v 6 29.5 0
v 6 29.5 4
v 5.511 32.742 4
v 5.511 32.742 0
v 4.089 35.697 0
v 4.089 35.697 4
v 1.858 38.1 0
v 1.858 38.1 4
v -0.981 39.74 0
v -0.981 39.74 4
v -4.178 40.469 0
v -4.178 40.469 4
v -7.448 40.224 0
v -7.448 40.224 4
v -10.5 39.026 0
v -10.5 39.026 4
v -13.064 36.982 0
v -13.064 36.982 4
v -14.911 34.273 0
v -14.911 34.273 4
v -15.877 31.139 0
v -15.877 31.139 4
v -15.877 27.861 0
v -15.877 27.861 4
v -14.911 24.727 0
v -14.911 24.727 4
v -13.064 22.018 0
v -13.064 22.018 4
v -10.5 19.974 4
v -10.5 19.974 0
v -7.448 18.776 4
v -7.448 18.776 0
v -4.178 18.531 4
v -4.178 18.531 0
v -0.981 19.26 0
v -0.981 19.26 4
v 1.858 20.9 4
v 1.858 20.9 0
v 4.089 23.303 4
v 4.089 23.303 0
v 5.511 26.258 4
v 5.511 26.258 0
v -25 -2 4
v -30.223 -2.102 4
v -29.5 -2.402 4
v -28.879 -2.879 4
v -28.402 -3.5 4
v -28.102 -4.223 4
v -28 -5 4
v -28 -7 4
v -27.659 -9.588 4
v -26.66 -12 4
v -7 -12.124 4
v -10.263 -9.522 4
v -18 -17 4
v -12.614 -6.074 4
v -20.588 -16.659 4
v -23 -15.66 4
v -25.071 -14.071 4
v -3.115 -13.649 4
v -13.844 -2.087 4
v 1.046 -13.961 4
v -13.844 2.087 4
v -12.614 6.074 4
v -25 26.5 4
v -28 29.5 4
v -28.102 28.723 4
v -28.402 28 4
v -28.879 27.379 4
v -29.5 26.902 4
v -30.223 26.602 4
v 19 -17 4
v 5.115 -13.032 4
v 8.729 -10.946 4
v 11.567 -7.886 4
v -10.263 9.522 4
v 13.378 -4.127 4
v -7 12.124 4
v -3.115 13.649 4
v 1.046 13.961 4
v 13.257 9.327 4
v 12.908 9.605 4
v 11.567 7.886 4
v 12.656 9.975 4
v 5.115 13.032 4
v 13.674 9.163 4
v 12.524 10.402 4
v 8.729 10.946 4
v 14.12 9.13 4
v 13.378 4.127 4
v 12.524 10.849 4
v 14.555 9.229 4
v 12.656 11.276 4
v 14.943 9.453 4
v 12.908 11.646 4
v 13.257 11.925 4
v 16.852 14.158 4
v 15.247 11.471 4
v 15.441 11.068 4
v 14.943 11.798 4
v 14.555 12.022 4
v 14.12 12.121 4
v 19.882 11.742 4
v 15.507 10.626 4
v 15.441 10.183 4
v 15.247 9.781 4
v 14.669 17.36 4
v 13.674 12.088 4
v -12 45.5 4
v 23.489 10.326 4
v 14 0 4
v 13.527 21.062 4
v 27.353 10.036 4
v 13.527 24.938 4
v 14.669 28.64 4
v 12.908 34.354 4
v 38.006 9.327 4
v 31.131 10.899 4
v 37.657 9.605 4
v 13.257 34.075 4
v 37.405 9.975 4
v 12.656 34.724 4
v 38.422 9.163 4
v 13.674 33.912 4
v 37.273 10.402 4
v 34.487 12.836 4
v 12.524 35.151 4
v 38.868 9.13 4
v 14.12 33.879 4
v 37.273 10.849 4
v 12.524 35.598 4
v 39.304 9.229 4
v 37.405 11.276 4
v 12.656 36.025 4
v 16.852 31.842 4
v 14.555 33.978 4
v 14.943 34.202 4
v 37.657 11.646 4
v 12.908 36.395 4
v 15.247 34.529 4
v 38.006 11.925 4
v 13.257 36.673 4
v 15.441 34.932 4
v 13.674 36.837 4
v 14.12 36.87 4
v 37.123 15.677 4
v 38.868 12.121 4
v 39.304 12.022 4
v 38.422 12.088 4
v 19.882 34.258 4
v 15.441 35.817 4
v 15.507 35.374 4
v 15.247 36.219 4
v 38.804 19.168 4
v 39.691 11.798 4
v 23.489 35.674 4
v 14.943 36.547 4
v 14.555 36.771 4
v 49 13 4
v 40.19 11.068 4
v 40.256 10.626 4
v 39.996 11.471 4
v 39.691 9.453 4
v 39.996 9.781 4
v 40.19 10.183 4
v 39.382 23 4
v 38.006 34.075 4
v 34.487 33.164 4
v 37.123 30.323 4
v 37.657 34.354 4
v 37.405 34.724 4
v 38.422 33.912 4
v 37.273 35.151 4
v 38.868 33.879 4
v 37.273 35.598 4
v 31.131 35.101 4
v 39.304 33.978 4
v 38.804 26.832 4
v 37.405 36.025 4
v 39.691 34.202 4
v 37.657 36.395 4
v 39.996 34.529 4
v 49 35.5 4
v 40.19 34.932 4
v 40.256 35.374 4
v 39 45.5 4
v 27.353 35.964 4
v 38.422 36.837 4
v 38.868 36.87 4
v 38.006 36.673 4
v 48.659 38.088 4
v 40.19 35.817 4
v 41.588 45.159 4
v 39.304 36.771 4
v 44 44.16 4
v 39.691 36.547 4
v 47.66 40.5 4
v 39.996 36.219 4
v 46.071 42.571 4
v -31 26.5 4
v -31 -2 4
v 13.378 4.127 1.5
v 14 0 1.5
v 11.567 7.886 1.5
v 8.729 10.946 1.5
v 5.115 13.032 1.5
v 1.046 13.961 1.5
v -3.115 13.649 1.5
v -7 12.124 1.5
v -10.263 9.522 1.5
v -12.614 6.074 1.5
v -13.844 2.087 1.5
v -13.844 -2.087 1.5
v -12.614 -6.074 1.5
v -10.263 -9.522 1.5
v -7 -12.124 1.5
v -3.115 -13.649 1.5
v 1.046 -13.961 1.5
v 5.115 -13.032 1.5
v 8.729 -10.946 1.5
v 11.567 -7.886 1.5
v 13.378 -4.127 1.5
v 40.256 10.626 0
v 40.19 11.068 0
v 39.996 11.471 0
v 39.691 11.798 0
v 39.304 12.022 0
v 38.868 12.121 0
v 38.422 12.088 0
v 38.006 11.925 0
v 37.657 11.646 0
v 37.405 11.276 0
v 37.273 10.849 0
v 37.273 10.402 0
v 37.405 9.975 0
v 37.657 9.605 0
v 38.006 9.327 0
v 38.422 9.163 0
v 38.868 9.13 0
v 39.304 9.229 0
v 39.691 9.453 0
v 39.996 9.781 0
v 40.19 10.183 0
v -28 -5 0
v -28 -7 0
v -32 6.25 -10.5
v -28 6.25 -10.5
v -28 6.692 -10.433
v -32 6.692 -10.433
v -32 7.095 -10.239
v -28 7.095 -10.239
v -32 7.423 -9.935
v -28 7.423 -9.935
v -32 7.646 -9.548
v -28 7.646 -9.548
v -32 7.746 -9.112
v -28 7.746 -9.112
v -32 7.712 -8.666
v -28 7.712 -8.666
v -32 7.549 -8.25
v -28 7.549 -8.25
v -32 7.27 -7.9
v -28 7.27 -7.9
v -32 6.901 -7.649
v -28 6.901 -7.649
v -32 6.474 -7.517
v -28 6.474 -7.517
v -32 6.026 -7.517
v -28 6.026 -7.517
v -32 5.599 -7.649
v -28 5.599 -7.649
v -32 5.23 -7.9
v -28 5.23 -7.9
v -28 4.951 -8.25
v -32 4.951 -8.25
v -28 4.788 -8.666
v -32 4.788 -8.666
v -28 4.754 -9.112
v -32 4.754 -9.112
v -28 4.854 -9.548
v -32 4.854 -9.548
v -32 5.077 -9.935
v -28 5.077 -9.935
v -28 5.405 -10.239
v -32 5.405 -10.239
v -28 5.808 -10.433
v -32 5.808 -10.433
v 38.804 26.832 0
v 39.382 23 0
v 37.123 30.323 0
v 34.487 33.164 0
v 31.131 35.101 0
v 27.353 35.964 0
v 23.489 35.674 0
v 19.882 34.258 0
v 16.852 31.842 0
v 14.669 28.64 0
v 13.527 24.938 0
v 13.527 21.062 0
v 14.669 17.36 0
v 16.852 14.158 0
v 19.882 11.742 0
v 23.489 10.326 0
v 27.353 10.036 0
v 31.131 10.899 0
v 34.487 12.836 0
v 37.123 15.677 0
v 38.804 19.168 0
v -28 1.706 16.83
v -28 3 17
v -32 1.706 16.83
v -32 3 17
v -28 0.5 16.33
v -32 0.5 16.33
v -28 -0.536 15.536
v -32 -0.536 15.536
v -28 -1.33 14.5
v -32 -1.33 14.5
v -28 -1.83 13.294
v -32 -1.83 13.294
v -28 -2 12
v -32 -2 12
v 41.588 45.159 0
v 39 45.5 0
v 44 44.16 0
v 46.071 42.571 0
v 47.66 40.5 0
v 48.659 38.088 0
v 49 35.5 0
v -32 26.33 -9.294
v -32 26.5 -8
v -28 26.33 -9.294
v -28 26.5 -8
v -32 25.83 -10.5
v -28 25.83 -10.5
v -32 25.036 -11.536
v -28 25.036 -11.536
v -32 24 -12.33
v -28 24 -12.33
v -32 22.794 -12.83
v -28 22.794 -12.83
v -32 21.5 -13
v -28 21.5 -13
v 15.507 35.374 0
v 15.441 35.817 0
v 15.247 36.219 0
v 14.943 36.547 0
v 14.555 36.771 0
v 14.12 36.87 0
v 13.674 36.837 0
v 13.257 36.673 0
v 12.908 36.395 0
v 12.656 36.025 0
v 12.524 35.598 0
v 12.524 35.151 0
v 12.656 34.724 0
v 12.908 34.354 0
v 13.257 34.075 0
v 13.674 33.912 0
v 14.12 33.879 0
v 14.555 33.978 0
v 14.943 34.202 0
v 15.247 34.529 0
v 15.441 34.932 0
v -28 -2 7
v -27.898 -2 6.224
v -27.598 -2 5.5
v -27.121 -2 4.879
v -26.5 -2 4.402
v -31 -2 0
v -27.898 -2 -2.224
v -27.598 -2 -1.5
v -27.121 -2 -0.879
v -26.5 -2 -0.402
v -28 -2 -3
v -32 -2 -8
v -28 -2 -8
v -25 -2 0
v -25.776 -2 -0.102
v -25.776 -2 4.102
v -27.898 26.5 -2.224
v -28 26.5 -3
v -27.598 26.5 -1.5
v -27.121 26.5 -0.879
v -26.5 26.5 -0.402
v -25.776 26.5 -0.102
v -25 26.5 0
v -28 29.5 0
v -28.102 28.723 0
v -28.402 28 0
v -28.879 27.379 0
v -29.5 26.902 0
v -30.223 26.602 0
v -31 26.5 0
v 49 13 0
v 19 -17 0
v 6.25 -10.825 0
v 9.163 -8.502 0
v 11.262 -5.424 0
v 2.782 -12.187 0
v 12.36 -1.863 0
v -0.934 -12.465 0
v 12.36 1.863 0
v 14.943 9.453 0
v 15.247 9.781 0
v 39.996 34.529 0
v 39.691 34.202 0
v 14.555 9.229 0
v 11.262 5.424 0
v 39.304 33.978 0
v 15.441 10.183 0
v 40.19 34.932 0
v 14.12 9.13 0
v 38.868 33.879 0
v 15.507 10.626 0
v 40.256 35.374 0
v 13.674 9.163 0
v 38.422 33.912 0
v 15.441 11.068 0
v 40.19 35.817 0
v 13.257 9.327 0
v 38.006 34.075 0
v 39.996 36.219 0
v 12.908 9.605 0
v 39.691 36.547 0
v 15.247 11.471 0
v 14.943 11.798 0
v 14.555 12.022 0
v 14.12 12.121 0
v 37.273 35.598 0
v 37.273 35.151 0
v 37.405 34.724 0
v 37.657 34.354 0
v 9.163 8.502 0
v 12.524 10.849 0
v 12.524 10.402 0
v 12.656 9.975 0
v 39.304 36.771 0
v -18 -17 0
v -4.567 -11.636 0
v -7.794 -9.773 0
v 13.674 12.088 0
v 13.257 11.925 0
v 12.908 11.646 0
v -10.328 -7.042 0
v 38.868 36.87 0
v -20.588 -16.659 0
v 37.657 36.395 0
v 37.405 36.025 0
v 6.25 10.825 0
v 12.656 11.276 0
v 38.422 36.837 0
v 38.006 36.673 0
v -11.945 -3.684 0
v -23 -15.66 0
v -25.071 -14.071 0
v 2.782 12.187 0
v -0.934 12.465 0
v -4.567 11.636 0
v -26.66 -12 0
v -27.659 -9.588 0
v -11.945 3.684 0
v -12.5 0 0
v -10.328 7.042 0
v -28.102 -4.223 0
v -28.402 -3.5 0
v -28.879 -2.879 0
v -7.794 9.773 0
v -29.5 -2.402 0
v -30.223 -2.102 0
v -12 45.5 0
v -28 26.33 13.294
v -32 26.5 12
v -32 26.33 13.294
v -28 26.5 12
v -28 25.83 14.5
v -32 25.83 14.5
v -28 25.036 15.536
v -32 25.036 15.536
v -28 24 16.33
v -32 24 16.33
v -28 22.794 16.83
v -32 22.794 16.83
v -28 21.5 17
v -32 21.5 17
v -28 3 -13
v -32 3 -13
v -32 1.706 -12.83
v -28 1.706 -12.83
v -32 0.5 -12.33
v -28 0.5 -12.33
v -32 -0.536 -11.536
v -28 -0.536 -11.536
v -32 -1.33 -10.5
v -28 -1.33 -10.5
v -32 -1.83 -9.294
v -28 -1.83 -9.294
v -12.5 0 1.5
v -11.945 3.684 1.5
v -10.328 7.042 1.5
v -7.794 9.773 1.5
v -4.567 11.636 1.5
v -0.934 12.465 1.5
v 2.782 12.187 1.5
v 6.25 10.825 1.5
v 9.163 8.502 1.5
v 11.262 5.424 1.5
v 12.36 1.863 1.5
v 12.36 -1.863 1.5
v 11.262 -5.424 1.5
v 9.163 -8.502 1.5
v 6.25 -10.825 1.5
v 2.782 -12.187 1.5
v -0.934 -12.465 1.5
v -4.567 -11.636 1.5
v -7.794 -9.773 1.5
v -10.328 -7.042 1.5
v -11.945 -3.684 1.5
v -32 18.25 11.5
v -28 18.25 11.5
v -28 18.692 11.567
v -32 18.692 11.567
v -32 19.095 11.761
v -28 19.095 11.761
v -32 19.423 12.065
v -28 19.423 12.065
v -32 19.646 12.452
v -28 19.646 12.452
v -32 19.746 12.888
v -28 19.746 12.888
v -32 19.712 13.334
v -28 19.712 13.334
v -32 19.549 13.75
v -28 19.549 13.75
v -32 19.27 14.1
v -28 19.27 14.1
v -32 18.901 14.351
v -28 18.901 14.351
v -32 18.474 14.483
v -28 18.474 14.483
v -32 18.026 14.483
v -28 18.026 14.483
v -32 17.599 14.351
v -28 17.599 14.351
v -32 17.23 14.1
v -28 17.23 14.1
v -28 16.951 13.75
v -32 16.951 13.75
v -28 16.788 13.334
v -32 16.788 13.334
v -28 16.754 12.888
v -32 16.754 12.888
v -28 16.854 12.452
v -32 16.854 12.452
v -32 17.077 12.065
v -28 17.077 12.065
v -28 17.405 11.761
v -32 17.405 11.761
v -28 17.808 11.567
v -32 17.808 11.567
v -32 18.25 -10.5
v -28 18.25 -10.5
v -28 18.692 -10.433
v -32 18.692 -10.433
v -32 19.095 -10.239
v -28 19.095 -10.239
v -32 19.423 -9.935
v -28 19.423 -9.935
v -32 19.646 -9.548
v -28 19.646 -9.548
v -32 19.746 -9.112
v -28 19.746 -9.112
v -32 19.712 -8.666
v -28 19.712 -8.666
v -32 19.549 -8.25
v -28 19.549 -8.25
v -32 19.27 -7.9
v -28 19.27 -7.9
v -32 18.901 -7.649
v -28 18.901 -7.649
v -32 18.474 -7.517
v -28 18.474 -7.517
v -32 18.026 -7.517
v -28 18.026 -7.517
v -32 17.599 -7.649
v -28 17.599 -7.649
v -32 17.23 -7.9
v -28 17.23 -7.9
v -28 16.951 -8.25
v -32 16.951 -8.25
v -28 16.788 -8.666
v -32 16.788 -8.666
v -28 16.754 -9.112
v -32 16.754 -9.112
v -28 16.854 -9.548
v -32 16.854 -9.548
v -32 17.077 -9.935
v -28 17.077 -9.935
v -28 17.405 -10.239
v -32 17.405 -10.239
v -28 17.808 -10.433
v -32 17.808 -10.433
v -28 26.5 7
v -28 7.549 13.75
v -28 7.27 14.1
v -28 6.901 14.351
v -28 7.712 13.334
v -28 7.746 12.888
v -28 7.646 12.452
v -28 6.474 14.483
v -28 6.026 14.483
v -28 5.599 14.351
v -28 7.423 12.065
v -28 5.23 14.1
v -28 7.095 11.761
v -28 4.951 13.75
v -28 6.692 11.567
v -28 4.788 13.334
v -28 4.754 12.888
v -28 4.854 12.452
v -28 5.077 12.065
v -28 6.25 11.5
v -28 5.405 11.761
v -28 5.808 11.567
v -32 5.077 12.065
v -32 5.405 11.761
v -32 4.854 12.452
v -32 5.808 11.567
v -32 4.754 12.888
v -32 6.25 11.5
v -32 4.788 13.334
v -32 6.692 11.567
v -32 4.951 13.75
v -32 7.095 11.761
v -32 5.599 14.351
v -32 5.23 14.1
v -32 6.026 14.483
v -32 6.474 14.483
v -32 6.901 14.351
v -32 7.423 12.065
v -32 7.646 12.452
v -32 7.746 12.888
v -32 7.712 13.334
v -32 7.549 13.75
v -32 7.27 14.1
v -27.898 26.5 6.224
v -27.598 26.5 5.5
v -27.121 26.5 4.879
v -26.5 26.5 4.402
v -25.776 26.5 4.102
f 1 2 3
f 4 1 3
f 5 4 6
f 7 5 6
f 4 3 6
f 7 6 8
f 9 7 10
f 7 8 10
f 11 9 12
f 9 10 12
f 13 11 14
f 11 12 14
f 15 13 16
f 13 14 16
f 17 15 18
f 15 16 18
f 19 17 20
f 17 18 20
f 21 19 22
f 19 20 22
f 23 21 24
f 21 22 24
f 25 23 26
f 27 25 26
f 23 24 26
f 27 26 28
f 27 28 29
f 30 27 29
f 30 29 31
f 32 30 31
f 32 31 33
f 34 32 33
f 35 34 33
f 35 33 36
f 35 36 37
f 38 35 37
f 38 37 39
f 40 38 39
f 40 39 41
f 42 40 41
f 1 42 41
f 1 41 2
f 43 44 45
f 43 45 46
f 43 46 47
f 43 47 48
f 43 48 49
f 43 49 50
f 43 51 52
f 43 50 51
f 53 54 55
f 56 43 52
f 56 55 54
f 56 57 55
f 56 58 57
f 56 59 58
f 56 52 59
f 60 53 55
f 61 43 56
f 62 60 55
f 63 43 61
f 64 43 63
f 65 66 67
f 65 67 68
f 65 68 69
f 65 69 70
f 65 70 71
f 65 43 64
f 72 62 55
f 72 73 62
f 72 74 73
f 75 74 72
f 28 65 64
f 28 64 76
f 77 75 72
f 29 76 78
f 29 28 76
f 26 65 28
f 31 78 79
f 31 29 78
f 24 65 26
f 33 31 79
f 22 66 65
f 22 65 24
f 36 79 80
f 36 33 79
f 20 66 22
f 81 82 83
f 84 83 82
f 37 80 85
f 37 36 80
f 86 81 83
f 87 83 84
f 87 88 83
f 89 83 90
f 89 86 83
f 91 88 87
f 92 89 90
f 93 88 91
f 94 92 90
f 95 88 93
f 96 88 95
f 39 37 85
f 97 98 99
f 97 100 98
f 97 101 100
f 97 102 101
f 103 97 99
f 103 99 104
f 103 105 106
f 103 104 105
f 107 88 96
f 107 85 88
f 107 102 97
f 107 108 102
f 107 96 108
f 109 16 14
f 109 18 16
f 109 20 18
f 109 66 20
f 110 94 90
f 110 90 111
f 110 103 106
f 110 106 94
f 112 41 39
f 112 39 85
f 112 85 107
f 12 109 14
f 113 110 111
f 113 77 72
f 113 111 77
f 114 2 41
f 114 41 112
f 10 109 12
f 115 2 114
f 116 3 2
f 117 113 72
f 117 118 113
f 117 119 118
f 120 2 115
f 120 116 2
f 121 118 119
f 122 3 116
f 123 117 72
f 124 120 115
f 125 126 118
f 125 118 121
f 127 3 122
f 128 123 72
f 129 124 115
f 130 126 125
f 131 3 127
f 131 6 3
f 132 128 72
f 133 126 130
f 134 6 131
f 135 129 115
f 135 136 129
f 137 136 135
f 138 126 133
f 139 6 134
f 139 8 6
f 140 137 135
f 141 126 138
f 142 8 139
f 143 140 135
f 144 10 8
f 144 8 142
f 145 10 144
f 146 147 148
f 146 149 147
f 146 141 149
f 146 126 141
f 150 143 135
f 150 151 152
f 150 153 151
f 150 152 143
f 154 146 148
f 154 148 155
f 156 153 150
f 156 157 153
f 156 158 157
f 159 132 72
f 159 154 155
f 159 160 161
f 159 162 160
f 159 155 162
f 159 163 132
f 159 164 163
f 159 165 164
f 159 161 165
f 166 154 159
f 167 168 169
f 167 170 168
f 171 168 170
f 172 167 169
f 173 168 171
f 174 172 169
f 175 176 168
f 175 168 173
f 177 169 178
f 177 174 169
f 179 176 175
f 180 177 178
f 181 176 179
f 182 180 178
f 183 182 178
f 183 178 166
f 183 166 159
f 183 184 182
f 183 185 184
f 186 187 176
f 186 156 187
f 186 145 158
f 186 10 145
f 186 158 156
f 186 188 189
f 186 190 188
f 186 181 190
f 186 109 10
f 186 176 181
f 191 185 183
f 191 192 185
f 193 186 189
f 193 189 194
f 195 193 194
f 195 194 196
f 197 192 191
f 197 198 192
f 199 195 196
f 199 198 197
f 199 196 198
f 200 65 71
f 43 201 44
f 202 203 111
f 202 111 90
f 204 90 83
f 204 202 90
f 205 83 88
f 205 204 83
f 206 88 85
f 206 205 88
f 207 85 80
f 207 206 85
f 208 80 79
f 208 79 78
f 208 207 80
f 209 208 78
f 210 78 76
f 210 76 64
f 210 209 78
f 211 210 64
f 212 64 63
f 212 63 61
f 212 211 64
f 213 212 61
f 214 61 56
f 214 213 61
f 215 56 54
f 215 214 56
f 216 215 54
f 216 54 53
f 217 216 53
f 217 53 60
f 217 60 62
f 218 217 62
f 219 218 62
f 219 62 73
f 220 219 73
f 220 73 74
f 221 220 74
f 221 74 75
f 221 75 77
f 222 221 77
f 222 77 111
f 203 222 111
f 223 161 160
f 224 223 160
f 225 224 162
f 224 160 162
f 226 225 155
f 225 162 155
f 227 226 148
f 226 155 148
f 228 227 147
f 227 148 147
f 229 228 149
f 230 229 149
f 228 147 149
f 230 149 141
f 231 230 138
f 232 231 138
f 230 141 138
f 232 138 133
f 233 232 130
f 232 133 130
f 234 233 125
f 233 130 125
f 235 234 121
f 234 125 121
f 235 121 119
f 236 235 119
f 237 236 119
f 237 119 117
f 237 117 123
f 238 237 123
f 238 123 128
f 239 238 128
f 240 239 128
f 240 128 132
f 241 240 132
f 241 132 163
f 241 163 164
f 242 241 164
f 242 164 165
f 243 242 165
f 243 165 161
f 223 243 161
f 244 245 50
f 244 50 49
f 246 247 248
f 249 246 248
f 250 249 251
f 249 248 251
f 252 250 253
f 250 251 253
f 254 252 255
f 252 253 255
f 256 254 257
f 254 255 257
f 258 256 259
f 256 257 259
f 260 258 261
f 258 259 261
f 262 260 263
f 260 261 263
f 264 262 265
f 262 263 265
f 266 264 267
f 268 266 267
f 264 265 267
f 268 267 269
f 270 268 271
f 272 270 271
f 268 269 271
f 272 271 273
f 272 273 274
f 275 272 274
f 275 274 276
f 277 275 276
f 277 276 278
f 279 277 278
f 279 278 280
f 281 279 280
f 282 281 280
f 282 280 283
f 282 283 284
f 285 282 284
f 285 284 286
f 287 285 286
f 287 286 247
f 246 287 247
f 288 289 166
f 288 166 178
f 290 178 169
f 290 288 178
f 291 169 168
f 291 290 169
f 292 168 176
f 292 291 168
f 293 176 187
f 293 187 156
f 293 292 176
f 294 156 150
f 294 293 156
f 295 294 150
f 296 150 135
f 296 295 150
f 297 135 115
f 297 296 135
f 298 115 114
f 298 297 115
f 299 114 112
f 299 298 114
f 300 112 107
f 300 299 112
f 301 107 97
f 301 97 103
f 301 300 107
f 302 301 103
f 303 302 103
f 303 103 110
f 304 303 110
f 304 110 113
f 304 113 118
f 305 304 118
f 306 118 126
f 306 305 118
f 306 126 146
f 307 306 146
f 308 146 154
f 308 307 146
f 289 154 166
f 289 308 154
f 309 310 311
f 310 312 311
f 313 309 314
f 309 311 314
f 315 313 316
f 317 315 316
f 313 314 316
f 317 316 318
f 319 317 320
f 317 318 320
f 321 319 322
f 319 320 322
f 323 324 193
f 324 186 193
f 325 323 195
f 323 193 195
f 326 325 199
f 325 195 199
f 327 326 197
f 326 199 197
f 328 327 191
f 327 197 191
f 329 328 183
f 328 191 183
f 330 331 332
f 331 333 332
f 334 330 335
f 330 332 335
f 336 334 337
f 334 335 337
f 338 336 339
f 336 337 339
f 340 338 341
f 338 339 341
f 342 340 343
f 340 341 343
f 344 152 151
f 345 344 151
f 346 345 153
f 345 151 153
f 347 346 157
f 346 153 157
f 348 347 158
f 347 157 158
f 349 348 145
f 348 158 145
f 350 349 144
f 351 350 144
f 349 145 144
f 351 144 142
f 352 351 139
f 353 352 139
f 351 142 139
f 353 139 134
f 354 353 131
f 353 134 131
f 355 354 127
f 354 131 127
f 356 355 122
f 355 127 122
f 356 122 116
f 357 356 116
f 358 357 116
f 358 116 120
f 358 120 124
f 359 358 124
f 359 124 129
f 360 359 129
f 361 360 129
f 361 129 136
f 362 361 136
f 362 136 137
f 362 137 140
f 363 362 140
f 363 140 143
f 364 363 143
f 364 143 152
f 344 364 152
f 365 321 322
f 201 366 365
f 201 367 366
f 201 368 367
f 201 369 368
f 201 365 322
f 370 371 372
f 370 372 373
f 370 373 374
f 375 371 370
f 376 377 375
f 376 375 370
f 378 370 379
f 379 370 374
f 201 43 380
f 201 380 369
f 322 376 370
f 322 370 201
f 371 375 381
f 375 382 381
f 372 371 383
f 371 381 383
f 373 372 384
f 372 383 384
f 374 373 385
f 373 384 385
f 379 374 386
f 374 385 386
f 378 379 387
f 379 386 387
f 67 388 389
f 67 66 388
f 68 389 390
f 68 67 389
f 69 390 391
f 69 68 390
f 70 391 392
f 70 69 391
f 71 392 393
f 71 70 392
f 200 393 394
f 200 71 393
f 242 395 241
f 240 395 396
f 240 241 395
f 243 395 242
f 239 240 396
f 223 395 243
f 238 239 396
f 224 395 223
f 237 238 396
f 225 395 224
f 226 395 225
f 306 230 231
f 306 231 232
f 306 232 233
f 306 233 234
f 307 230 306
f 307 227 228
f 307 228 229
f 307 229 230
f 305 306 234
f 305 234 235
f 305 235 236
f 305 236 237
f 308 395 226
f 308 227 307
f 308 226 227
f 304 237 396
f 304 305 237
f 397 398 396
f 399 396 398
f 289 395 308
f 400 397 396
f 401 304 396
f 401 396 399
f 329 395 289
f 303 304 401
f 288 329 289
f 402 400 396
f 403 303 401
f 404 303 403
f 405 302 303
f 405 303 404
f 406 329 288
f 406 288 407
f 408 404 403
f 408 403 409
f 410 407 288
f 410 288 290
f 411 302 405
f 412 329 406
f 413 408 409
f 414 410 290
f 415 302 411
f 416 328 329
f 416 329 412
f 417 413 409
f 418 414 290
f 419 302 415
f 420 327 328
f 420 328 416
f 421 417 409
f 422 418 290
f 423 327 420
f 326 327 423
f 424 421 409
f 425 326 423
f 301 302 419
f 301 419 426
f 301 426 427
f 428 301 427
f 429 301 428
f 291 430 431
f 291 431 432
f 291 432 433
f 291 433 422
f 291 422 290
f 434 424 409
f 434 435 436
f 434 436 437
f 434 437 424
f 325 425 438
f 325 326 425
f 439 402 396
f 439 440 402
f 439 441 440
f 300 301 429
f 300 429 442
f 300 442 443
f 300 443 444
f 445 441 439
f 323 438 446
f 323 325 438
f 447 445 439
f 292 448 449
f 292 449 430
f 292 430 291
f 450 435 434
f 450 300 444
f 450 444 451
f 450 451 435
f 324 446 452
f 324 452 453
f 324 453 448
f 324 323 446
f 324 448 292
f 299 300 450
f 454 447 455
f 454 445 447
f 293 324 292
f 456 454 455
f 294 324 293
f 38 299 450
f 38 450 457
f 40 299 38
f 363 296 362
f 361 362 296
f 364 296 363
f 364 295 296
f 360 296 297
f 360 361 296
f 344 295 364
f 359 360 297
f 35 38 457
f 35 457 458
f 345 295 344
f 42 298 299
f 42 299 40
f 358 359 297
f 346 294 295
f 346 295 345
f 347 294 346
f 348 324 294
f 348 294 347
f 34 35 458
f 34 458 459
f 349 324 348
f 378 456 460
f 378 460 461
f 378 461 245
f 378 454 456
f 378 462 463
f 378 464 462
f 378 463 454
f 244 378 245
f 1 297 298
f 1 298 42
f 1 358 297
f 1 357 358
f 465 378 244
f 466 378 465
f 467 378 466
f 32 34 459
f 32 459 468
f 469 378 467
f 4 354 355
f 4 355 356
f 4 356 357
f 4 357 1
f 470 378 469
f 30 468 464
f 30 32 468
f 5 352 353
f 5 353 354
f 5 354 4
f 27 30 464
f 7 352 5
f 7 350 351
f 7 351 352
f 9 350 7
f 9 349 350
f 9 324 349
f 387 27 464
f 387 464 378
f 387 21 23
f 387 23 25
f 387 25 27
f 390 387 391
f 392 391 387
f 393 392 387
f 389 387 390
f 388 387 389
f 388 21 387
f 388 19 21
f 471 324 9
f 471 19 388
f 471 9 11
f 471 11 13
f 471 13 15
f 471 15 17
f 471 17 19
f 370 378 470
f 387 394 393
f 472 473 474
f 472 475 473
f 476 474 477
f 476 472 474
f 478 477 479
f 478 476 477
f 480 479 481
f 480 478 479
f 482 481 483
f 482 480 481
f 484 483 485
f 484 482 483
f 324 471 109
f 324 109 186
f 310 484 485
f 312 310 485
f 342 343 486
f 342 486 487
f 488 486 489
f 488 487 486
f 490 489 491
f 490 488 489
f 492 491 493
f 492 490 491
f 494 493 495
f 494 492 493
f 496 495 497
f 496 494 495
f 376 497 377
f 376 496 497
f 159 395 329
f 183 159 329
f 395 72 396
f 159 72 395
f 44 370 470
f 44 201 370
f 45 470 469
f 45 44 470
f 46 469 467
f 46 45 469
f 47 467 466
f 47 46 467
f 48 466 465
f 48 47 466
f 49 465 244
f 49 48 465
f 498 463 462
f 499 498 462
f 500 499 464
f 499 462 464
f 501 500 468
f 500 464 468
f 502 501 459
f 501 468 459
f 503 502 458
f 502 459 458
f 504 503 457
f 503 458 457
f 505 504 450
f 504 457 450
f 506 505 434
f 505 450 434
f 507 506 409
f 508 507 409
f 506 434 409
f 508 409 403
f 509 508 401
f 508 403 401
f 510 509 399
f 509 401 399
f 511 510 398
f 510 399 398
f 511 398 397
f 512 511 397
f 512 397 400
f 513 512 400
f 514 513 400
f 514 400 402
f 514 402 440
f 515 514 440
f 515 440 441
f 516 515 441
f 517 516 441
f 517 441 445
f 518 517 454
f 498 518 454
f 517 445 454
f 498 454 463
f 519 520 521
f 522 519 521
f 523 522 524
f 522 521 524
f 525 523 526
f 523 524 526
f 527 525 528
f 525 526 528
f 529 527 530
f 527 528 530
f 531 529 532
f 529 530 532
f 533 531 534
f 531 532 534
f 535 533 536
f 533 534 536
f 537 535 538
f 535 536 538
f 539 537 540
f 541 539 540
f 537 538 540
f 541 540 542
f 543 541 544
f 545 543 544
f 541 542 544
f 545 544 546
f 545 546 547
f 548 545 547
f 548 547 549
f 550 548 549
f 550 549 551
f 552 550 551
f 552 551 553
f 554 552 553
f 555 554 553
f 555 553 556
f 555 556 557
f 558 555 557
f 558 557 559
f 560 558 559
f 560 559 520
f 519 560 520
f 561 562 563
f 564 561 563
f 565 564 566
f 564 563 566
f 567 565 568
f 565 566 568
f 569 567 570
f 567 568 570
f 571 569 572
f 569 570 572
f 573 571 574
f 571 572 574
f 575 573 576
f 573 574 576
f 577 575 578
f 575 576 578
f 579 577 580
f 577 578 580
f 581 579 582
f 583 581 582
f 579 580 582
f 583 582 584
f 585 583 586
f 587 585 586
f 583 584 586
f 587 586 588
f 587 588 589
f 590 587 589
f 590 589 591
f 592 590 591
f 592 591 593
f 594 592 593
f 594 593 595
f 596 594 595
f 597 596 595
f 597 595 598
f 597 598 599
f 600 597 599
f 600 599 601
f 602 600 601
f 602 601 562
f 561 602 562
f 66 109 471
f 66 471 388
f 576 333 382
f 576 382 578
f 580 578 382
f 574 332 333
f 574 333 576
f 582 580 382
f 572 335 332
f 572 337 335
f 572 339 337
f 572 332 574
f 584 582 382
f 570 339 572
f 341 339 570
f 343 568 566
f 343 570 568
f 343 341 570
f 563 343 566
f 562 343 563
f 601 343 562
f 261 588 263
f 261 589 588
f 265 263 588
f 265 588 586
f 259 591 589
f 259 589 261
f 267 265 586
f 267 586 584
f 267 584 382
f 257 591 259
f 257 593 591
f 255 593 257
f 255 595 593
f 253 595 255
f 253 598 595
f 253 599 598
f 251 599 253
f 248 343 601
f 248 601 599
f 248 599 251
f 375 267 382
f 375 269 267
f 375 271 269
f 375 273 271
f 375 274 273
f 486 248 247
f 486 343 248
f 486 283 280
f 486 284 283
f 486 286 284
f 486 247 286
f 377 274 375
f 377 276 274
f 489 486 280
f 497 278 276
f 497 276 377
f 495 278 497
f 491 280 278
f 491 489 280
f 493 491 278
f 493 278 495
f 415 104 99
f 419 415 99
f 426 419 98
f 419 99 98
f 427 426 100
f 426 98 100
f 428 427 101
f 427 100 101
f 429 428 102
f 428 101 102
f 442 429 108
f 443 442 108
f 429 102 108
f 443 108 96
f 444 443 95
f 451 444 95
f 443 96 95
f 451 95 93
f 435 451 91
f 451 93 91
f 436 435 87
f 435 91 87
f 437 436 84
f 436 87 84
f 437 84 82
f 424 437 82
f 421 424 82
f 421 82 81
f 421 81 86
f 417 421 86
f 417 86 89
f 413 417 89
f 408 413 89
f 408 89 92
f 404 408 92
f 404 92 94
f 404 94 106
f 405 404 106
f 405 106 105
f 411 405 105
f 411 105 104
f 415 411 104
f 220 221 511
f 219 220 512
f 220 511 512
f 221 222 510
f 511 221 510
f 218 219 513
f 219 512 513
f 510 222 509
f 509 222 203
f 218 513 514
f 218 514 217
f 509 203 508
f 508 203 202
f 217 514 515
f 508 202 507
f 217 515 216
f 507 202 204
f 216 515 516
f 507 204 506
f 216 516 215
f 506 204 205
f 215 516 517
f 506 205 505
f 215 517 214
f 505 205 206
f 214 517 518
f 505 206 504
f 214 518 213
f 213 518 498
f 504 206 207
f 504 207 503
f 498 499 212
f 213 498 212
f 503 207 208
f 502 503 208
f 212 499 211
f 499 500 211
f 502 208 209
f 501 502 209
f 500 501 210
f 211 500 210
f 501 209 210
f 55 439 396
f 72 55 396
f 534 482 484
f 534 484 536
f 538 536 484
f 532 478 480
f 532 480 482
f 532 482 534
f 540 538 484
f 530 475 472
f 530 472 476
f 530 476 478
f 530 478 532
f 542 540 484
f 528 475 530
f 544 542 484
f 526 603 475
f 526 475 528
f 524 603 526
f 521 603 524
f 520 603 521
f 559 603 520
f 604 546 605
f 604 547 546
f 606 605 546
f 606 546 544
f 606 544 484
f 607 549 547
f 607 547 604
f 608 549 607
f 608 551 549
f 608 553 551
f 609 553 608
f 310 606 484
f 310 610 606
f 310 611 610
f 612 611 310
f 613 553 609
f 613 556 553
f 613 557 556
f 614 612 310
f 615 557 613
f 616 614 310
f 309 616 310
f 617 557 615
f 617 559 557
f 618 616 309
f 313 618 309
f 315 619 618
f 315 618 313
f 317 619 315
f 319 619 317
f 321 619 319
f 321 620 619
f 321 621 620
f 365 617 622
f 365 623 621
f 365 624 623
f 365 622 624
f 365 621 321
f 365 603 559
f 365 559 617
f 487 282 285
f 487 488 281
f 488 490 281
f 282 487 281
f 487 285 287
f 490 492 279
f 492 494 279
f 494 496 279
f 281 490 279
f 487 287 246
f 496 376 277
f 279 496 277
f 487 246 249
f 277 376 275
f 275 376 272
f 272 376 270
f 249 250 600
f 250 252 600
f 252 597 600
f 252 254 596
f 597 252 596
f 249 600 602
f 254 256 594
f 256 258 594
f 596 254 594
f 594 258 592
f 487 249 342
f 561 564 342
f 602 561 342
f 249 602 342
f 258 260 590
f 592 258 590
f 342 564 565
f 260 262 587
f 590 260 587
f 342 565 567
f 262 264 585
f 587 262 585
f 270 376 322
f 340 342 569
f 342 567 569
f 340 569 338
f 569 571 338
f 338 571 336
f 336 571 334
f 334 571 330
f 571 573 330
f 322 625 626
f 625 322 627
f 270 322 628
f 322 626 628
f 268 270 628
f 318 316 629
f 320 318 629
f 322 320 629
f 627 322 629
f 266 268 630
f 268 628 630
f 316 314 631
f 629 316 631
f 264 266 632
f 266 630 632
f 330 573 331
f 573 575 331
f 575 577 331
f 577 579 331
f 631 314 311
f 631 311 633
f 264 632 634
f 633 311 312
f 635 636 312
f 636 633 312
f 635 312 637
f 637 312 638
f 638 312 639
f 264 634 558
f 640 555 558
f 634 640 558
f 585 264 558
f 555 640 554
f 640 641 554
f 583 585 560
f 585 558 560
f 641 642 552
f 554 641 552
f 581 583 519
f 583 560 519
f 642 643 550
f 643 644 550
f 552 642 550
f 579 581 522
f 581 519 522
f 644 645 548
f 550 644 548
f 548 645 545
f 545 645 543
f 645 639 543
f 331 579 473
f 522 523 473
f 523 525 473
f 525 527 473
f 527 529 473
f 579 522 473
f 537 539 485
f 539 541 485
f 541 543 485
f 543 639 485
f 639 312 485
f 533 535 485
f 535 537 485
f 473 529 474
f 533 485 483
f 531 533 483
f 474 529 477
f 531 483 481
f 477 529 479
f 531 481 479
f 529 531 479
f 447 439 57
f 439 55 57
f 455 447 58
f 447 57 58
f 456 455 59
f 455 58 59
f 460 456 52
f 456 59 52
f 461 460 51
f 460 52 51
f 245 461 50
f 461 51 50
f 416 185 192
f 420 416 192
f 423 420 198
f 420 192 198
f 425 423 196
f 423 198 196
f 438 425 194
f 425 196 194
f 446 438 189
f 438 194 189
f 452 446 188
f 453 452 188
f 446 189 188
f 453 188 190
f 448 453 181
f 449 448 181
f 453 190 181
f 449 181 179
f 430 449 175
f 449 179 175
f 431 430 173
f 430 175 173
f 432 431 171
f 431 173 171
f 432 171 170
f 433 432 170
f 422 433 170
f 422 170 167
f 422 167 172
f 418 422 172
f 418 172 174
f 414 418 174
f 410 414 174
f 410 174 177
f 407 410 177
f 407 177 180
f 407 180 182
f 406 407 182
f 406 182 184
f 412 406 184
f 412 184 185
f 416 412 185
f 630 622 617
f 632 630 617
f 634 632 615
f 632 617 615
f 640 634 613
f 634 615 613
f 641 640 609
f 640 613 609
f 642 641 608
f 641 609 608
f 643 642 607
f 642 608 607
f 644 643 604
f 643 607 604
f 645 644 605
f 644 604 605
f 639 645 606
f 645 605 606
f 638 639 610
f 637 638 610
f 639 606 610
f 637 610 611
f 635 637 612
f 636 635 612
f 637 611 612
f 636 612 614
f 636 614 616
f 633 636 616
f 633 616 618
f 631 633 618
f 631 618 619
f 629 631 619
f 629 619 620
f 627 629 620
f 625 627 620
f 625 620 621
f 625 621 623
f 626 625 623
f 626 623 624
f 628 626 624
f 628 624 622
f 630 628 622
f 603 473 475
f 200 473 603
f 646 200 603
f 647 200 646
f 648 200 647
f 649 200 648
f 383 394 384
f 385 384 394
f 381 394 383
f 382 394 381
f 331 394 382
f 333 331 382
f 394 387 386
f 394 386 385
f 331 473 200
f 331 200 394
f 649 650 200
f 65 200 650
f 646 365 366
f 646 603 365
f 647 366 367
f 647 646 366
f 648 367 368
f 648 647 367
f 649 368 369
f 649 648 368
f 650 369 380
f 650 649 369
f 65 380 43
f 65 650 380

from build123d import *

# Parameters (mm, degrees)
SKETCH_1_W           = 77
SKETCH_1_H           = 62.5
SKETCH_1_R           = 14
SKETCH_1_R_2         = 13
EXTRUDE_1_DEPTH      = 4
EXTRUDE_2_DEPTH      = 17
EXTRUDE_2_DEPTH_BACK = 13
FILLET_1_R           = 3
SKETCH_4_W           = 20
SKETCH_4_H           = 28.5
CUT_EXTRUDE_3_DEPTH  = 74
SKETCH_9_R           = 1.5
CUT_EXTRUDE_6_DEPTH  = 10
SKETCH_10_R          = 1.5
CUT_EXTRUDE_7_DEPTH  = 10
FILLET_2_R           = 5
CUT_EXTRUDE_8_DEPTH  = 10
FILLET_3_R           = 10
FILLET_4_R           = 3
SKETCH_13_R          = 14
SKETCH_13_R_2        = 12.5
EXTRUDE_3_DEPTH      = 1.5
SKETCH_14_R          = 11
CUT_EXTRUDE_9_DEPTH  = 10


with BuildPart() as part:
    # 草图1 → 凸台-拉伸1 (new body)
    with BuildSketch(Plane.XY):
        with Locations((10.5, 14.25)):
            Rectangle(SKETCH_1_W, SKETCH_1_H)
        Circle(SKETCH_1_R, mode=Mode.SUBTRACT)
        with Locations((26.381811917, 23)):
            Circle(SKETCH_1_R_2, mode=Mode.SUBTRACT)
    extrude(amount=EXTRUDE_1_DEPTH)

    # 草图1<3> → 凸台-拉伸2 (add, two sides: drawn at the far end of the back side and taken through both)
    with BuildSketch(Plane.XY.offset(-EXTRUDE_2_DEPTH_BACK)):
        Polygon((-52, 22.5), (-52, 26.5), (-28, 26.5), (-28, -2), (-52, -2), (-52, 2), (-32, 2), (-32, 22.5), align=None)
    extrude(amount=EXTRUDE_2_DEPTH + EXTRUDE_2_DEPTH_BACK)

    # 圆角1
    fillet_1_edges = [part.edges().sort_by_distance(p)[0] for p in [
        (-28, 12.25, 0),
        (-28, 12.25, 4),
    ]]
    fillet(fillet_1_edges, radius=FILLET_1_R)

    # 草图4 → 切除-拉伸3 (cut)
    with BuildSketch(Plane.XY.offset(17)):
        with Locations((-42, 12.25)):
            Rectangle(SKETCH_4_W, SKETCH_4_H)
    extrude(amount=-CUT_EXTRUDE_3_DEPTH, mode=Mode.SUBTRACT)

    # 草图9 → 切除-拉伸6 (cut)
    with BuildSketch(Plane.XY.offset(4)):
        with Locations((38.756180587, 35.374368671)):
            Circle(SKETCH_9_R)
        with Locations((38.756180587, 10.625631329)):
            Circle(SKETCH_9_R)
        with Locations((14.007443246, 10.625631329)):
            Circle(SKETCH_9_R)
        with Locations((14.007443246, 35.374368671)):
            Circle(SKETCH_9_R)
    extrude(amount=-CUT_EXTRUDE_6_DEPTH, mode=Mode.SUBTRACT)

    # 草图10 → 切除-拉伸7 (cut)
    with BuildSketch(Plane(origin=(-28, 0, 0), x_dir=(0, 0, -1), z_dir=(1, 0, 0))):
        with Locations((-13, 18.25)):
            Circle(SKETCH_10_R)
        with Locations((-13, 6.25)):
            Circle(SKETCH_10_R)
        with Locations((9, 18.25)):
            Circle(SKETCH_10_R)
        with Locations((9, 6.25)):
            Circle(SKETCH_10_R)
    extrude(amount=-CUT_EXTRUDE_7_DEPTH, mode=Mode.SUBTRACT)

    # 圆角2
    fillet_2_edges = [part.edges().sort_by_distance(p)[0] for p in [
        (-30, -2, 17),
        (-30, -2, -13),
        (-30, 26.5, 17),
        (-30, 26.5, -13),
    ]]
    fillet(fillet_2_edges, radius=FILLET_2_R)

    # 草图11 → 切除-拉伸8 (cut)
    with BuildSketch(Plane.XY.offset(4)):
        Polygon((-28, 29.5), (-28, 45.5), (-12, 45.5), align=None)
        Polygon((19, -17), (49, 13), (49, -17), align=None)
    extrude(amount=-CUT_EXTRUDE_8_DEPTH, mode=Mode.SUBTRACT)

    # 圆角3
    fillet_3_edges = [part.edges().sort_by_distance(p)[0] for p in [
        (-28, -17, 2),
        (49, 45.5, 2),
    ]]
    fillet(fillet_3_edges, radius=FILLET_3_R)

    # 圆角4
    fillet_4_edges = [part.edges().sort_by_distance(p)[0] for p in [
        (-28, -2, 2),
        (-28, 26.5, 2),
    ]]
    fillet(fillet_4_edges, radius=FILLET_4_R - 0.0001)  # a hair under: the kernel refuses the full size

    # 草图13 → 凸台-拉伸3 (add)
    with BuildSketch(Plane(origin=(0, 0, 0), x_dir=(-1, 0, 0), z_dir=(0, 0, -1))):
        Circle(SKETCH_13_R)
        Circle(SKETCH_13_R_2, mode=Mode.SUBTRACT)
    extrude(amount=-EXTRUDE_3_DEPTH)

    # 草图14 → 切除-拉伸9 (cut)
    with BuildSketch(Plane.XY.offset(4)):
        with Locations((-5, 29.5)):
            Circle(SKETCH_14_R)
    extrude(amount=-CUT_EXTRUDE_9_DEPTH, mode=Mode.SUBTRACT)


solid = part.part
